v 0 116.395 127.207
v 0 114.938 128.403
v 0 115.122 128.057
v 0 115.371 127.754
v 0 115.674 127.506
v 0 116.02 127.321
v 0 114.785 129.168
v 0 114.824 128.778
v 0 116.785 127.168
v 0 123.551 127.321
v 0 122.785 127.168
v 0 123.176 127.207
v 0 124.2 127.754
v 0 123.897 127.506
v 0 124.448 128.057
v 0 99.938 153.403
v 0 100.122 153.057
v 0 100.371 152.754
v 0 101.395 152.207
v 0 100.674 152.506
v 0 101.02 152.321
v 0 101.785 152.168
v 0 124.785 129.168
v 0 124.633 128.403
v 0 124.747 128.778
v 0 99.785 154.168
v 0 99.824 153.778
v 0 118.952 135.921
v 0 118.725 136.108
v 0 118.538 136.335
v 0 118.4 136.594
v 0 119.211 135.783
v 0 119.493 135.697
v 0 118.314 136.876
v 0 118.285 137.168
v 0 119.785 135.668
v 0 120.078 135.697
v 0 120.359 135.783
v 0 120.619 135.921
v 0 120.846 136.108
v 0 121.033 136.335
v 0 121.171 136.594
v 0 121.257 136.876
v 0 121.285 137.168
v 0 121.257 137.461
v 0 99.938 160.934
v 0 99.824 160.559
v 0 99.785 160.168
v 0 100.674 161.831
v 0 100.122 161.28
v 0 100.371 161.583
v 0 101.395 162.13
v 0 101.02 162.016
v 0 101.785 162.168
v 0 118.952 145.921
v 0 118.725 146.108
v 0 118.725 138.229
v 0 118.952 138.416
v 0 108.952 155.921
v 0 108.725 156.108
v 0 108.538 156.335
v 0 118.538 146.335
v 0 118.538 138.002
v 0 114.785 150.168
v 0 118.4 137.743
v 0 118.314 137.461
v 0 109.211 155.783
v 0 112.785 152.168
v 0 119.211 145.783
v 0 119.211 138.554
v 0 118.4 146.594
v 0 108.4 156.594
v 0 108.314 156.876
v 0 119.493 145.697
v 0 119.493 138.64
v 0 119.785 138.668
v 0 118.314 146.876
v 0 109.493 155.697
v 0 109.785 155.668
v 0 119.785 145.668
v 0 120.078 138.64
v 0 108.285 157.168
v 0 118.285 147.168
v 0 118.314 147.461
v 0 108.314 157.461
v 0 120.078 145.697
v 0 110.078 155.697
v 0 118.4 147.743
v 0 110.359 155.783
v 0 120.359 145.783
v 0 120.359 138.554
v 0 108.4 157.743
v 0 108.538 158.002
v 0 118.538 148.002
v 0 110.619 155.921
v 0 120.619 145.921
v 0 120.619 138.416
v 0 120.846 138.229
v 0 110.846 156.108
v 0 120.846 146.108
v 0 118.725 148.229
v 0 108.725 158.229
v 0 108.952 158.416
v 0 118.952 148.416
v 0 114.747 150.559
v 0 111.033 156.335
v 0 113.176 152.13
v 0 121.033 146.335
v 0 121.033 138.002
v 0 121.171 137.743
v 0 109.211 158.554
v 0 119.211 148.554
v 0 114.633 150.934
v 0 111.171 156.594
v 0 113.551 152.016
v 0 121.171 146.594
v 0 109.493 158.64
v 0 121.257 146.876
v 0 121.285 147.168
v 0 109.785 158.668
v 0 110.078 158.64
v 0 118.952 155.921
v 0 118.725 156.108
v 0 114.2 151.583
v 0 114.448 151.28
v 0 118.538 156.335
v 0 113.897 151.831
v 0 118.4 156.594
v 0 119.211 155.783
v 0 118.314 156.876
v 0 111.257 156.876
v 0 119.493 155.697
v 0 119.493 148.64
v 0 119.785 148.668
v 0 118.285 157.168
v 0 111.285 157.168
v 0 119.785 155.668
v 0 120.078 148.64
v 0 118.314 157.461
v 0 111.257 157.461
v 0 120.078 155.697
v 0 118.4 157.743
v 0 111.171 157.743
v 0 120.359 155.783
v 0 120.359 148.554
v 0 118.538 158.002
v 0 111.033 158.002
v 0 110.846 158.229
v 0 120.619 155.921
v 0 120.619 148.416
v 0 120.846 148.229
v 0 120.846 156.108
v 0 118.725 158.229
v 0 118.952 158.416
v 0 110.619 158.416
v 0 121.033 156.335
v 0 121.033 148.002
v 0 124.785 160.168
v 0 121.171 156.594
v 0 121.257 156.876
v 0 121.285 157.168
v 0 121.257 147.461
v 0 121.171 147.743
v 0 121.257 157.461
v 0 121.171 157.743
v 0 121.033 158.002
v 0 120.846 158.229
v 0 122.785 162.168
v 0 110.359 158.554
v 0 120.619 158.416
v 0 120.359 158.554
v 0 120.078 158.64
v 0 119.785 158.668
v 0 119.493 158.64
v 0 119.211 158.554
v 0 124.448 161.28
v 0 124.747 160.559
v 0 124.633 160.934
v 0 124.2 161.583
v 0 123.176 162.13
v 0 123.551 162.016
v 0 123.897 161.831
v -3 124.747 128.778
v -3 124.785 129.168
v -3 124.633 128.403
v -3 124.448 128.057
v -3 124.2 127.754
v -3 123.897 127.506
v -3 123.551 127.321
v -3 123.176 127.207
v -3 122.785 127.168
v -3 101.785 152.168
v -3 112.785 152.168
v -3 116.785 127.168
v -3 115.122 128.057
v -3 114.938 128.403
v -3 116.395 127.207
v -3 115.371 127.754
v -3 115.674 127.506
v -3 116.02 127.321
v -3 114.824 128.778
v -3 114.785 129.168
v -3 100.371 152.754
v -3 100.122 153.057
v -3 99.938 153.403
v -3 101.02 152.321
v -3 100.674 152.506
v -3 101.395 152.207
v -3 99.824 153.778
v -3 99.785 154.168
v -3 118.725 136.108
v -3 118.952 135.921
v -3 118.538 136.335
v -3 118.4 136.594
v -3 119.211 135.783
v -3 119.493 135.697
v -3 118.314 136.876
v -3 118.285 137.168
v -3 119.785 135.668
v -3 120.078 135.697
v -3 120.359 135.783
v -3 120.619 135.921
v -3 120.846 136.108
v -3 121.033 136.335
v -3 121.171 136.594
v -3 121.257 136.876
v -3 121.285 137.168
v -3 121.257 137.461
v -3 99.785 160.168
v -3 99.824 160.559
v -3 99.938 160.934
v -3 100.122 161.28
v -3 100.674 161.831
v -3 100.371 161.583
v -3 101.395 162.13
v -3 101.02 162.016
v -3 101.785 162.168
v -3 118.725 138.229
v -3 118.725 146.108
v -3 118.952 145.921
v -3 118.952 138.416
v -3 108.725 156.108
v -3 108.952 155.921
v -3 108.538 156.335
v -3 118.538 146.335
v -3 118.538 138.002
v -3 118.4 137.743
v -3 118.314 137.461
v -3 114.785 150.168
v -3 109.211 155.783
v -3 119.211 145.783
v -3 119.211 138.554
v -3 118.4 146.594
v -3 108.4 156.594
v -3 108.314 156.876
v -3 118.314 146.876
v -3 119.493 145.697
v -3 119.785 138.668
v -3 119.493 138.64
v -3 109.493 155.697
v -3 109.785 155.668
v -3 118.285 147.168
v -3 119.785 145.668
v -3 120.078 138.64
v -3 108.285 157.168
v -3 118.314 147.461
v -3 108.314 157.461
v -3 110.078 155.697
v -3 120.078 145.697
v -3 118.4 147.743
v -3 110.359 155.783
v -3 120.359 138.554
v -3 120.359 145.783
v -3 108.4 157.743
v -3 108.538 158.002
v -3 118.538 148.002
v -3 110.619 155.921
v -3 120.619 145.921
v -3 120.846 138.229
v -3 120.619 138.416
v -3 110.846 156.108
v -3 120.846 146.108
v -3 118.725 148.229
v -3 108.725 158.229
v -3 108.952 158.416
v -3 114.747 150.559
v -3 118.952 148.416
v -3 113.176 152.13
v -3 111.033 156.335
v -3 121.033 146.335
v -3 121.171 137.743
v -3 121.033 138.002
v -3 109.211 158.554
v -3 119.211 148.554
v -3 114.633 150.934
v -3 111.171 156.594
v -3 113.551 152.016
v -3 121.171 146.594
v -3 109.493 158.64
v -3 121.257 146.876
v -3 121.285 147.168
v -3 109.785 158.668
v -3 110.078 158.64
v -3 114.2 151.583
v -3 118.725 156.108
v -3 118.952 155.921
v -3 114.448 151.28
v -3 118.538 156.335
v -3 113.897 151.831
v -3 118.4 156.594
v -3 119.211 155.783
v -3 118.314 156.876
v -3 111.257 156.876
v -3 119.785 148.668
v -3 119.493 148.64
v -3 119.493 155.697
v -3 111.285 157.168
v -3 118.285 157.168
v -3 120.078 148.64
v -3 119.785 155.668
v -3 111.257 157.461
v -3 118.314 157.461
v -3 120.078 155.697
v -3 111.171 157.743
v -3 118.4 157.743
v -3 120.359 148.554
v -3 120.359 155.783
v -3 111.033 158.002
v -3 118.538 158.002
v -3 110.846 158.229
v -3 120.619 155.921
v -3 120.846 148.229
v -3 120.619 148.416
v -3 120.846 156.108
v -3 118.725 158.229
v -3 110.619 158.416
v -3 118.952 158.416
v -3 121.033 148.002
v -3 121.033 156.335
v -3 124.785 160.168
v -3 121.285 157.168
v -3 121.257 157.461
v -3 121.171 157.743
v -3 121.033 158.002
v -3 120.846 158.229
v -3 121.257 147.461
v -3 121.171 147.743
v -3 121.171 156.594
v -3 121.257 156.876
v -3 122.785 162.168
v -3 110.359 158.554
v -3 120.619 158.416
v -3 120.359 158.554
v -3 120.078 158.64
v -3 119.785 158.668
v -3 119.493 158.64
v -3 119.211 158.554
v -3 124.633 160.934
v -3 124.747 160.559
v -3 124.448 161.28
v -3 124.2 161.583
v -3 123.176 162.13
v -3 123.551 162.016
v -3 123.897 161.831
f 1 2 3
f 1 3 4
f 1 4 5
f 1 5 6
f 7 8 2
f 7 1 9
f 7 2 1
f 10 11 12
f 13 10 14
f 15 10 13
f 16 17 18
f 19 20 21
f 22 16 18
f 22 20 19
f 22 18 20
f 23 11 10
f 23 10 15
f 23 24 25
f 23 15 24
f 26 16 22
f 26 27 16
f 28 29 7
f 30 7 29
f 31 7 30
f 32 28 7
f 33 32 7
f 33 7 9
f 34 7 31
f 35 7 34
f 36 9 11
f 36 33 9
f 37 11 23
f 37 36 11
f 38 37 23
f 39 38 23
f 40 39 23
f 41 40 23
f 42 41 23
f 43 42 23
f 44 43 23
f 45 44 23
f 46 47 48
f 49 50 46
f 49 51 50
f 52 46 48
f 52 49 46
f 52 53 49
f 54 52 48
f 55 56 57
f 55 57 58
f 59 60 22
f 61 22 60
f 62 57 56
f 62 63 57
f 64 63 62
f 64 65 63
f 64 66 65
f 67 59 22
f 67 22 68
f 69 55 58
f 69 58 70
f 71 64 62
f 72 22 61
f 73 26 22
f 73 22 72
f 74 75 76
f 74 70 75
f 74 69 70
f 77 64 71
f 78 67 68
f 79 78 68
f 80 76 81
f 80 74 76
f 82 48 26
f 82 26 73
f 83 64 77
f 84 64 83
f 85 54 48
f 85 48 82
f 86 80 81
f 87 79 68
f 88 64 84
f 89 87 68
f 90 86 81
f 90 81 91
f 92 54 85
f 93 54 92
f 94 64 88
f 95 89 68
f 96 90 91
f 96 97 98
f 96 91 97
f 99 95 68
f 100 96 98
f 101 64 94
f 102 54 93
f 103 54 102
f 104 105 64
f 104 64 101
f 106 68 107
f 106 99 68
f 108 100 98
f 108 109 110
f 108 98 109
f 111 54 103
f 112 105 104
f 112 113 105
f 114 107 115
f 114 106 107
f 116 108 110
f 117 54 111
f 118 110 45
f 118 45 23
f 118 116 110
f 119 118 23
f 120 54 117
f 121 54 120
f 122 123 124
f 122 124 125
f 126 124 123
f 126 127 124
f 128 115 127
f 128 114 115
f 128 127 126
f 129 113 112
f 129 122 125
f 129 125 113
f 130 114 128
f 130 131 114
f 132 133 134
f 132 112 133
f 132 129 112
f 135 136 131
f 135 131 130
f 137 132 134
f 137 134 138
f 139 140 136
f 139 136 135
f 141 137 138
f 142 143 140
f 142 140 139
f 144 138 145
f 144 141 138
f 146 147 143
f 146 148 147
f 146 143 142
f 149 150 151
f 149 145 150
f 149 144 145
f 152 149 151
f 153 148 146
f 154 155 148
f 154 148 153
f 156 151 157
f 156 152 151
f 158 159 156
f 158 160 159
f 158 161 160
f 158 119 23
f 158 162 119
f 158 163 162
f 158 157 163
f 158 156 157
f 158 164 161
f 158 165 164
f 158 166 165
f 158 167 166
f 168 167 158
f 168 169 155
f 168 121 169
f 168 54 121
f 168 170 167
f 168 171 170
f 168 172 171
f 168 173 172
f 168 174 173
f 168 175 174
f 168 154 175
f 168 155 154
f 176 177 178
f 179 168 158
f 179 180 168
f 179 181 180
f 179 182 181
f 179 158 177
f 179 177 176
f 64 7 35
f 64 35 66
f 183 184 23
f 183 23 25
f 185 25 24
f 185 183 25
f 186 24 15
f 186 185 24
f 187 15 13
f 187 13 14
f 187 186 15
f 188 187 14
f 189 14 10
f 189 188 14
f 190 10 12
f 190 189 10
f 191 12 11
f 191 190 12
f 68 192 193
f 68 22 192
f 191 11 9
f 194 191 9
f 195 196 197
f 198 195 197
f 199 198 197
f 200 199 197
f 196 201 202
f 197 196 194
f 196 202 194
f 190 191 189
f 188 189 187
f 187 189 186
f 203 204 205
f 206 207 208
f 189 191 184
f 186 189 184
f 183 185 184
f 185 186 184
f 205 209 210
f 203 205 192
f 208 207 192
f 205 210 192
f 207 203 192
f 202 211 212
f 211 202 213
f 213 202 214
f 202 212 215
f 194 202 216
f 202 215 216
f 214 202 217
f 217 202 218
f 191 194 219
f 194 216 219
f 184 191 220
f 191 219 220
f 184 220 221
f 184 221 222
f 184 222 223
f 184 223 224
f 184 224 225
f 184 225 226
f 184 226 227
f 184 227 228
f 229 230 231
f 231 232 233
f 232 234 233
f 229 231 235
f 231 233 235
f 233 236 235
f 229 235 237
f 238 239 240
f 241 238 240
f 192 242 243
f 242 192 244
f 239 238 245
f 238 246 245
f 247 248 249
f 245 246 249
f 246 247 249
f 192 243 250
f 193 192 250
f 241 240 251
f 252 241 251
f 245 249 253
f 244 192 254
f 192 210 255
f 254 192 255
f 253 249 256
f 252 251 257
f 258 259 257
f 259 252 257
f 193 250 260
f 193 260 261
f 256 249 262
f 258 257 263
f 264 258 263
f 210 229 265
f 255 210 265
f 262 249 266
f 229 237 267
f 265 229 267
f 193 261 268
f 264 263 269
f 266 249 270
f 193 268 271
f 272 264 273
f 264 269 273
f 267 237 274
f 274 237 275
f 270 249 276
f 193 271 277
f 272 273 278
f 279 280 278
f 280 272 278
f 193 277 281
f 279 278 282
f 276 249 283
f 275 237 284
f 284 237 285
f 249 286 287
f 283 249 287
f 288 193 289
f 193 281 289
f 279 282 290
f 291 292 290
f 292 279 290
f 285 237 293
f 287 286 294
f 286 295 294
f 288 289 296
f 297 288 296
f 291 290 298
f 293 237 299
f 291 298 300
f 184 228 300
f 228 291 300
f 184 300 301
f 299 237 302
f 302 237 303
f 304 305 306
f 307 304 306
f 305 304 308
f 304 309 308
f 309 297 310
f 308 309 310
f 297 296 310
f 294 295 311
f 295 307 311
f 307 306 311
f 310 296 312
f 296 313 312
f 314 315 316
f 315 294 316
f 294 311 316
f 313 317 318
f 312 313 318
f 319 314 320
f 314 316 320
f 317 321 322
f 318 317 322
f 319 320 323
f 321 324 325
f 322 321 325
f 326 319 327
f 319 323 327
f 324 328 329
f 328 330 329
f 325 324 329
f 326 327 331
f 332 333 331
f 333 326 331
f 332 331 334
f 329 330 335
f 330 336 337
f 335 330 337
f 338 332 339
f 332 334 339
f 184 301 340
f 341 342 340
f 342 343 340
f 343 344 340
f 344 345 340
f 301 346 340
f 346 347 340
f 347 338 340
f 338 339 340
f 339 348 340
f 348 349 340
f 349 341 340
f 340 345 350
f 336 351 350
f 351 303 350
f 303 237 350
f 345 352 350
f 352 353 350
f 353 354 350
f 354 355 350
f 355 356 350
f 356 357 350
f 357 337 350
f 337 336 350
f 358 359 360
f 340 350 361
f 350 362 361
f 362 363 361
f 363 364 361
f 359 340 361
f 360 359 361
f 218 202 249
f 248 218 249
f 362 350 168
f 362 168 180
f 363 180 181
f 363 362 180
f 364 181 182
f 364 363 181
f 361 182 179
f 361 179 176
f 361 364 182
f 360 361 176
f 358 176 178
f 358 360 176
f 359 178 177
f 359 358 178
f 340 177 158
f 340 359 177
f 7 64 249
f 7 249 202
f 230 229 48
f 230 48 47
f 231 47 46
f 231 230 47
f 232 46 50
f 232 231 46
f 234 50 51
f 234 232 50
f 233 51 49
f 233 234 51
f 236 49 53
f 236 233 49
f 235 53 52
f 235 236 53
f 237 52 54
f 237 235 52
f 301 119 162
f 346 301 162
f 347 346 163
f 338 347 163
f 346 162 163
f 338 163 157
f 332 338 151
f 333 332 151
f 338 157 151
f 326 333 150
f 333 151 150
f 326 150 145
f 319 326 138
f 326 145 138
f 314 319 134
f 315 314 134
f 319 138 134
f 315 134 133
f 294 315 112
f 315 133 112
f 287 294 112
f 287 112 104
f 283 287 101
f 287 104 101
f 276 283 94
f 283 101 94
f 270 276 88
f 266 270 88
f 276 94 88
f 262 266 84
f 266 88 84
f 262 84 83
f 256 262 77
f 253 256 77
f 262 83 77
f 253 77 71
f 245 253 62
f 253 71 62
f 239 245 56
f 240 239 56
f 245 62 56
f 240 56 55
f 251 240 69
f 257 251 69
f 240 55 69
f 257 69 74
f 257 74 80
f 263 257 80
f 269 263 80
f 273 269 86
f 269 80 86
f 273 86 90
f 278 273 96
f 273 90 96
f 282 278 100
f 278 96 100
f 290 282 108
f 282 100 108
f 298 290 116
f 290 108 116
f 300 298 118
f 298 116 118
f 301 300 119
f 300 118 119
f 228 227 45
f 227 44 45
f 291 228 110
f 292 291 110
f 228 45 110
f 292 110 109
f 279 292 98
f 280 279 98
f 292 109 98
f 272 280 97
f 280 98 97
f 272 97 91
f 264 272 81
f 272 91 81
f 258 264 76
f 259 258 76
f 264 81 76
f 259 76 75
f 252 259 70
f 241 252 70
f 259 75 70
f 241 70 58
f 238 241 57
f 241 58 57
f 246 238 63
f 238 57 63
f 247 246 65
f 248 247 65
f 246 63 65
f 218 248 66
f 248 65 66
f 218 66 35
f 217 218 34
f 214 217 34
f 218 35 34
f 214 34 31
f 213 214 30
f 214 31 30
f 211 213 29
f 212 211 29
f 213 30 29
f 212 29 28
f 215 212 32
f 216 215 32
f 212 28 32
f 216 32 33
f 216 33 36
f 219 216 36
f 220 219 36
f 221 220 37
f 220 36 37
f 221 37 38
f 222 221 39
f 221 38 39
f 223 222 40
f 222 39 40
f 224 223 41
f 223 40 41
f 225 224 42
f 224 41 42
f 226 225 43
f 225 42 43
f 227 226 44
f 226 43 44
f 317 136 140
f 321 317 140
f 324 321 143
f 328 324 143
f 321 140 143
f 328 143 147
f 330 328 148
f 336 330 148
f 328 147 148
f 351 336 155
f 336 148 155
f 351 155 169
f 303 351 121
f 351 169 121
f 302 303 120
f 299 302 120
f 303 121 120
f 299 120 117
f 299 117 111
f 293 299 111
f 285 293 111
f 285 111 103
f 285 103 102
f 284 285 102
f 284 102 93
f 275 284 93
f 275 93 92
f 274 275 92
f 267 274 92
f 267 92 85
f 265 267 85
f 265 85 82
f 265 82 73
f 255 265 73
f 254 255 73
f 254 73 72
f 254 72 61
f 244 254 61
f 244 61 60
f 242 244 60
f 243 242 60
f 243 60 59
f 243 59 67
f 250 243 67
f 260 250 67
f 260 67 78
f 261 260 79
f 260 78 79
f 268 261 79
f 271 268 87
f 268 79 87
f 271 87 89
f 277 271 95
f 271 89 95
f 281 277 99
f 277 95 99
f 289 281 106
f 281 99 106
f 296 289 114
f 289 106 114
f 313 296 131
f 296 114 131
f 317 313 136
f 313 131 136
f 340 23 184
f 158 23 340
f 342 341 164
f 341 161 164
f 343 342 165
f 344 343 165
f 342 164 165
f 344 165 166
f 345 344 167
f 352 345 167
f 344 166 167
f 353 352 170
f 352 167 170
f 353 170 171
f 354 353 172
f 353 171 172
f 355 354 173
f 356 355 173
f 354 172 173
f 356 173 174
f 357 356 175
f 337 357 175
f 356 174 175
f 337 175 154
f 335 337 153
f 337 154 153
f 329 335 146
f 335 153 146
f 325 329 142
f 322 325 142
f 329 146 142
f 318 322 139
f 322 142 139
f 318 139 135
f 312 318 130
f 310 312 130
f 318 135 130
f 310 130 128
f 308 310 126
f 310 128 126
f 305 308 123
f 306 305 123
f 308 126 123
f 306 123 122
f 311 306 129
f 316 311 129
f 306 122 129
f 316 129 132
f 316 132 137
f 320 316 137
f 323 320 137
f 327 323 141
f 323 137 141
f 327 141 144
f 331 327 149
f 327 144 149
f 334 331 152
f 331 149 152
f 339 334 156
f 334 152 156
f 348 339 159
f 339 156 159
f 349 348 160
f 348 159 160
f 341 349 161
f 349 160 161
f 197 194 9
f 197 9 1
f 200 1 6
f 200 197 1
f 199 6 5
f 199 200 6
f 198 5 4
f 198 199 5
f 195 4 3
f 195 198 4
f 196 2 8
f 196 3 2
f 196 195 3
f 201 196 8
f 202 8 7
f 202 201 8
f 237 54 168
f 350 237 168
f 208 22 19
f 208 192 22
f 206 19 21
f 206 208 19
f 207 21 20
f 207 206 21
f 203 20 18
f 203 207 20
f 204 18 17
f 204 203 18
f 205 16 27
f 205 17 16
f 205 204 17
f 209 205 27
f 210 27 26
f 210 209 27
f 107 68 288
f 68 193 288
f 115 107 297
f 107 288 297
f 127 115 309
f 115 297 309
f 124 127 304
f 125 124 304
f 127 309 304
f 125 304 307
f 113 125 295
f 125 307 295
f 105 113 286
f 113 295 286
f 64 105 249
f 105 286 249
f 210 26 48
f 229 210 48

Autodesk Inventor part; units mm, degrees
ref_plane "YZ Plane" through (0, 0, 0) normal (1, 0, 0) x (0, 1, 0)
ref_plane "XZ Plane" through (0, 0, 0) normal (0, 1, 0) x (-1, 0, 0)
ref_plane "XY Plane" through (0, 0, 0) normal (0, 0, 1) x (1, 0, 0)
sketch "スケッチ1" plane through (0, 0, 0) normal (1, 0, 0) x (0, 1, 0)
  line L0 (-115.2146, 152.1685) -> (124.7854, 152.1685)
  line L1 (124.7854, 152.1685) -> (114.7854, 152.1685)
  line L2 (114.7854, 152.1685) -> (114.7854, -77.8315)
  line L3 (114.7854, -77.8315) -> (124.7854, -77.8315)
  line L4 (124.7854, -77.8315) -> (124.7854, 152.1685)
  line L5 (-115.2146, 152.1685) -> (-105.2146, 152.1685)
  line L6 (-105.2146, 152.1685) -> (-105.2146, -77.8315)
  line L7 (-105.2146, -77.8315) -> (-115.2146, -77.8315)
  line L8 (-115.2146, -77.8315) -> (-115.2146, 152.1685)
  line L9 (124.7854, 152.1685) -> (124.7854, 162.1685)
  line L10 (-115.2146, 162.1685) -> (124.7854, 162.1685)
  line L11 (4.7854, 162.1685) -> (4.7854, -110.7311)
  line L12 (124.7854, 127.1685) -> (114.7854, 127.1685)
  line L13 (99.7854, 152.1685) -> (99.7854, 162.1685)
  circle A0 centre (119.7854, 137.1685) radius 1.5
  circle A1 centre (119.7854, 147.1685) radius 1.5
  circle A2 centre (119.7854, 157.1685) radius 1.5
  circle A3 centre (109.7854, 157.1685) radius 1.5
  line L14 (114.7854, 152.1685) -> (99.7854, 152.1685)
  line L15 (124.7854, 152.1685) -> (124.7854, 162.1685)
  line L16 (124.7854, 162.1685) -> (99.7854, 162.1685)
  point P0 (0, 0)
  point P1 (4.7854, -147.8315)
  point P2 (-110.2146, 157.1685)
  point P3 (-100.2146, 157.1685)
  point P4 (-110.2146, 147.1685)
  point P5 (-110.2146, 137.1685)
  dimension "d0" = 10
  dimension "d1" = 230
  dimension "d2" = 10
  dimension "d3" = 230
  dimension "d4" = 5
  dimension "d5" = 10
  dimension "d6" = 5
  dimension "d7" = 5
  dimension "d8" = 5
  dimension "d9" = 10
  dimension "d10" = 5
  dimension "d11" = 5
  dimension "d12" = 10
  dimension "d13" = 10
  dimension "d14" = 3
  dimension "d15" = 3
  dimension "d16" = 3
  dimension "d17" = 3
extrude "押し出し1" add sketch "スケッチ1" against normal blind 3 contours L13 L10 L9 L0 | L0 L4 L12 L2
fillet "フィレット1" radius 2 6 edges at (-1.5, 124.7854, 162.1685) (-1.5, 124.7854, 127.1685) (-1.5, 114.7854, 127.1685) (-1.5, 114.7854, 152.1685) (-1.5, 99.7854, 152.1685) (-1.5, 99.7854, 162.1685)
sketch "スケッチ3" plane through (0, 0, 0) normal (1, 0, 0) x (0, 0, -1)
  circle A0 centre (-157.1685, 119.7854) radius 1.5 projected
  circle A1 centre (-157.1685, 109.7854) radius 1.5 projected
  circle A2 centre (-147.1685, 119.7854) radius 1.5 projected
  circle A3 centre (-137.1685, 119.7854) radius 1.5 projected
  arc A4 (-162.1685, 101.7854) -> (-160.1685, 99.7854) centre (-160.1685, 101.7854) ccw projected
  line L0 (-160.1685, 99.7854) -> (-154.1685, 99.7854) projected
  arc A5 (-154.1685, 99.7854) -> (-152.1685, 101.7854) centre (-154.1685, 101.7854) ccw projected
  line L1 (-152.1685, 101.7854) -> (-152.1685, 112.7854) projected
  arc A6 (-150.1685, 114.7854) -> (-152.1685, 112.7854) centre (-150.1685, 112.7854) ccw projected
  line L2 (-150.1685, 114.7854) -> (-129.1685, 114.7854) projected
  arc A7 (-129.1685, 114.7854) -> (-127.1685, 116.7854) centre (-129.1685, 116.7854) ccw projected
  line L3 (-127.1685, 116.7854) -> (-127.1685, 122.7854) projected
  arc A8 (-127.1685, 122.7854) -> (-129.1685, 124.7854) centre (-129.1685, 122.7854) ccw projected
  line L4 (-129.1685, 124.7854) -> (-160.1685, 124.7854) projected
  arc A9 (-160.1685, 124.7854) -> (-162.1685, 122.7854) centre (-160.1685, 122.7854) ccw projected
  line L5 (-162.1685, 122.7854) -> (-162.1685, 101.7854) projected
  point P0 (0, 0)
equation "\"d7\" = d6"
equation "\"d11\" = d10"
properties part number "belt_liner_v1_MDF_F_1" material "MDF 中密度繊維ボード"
